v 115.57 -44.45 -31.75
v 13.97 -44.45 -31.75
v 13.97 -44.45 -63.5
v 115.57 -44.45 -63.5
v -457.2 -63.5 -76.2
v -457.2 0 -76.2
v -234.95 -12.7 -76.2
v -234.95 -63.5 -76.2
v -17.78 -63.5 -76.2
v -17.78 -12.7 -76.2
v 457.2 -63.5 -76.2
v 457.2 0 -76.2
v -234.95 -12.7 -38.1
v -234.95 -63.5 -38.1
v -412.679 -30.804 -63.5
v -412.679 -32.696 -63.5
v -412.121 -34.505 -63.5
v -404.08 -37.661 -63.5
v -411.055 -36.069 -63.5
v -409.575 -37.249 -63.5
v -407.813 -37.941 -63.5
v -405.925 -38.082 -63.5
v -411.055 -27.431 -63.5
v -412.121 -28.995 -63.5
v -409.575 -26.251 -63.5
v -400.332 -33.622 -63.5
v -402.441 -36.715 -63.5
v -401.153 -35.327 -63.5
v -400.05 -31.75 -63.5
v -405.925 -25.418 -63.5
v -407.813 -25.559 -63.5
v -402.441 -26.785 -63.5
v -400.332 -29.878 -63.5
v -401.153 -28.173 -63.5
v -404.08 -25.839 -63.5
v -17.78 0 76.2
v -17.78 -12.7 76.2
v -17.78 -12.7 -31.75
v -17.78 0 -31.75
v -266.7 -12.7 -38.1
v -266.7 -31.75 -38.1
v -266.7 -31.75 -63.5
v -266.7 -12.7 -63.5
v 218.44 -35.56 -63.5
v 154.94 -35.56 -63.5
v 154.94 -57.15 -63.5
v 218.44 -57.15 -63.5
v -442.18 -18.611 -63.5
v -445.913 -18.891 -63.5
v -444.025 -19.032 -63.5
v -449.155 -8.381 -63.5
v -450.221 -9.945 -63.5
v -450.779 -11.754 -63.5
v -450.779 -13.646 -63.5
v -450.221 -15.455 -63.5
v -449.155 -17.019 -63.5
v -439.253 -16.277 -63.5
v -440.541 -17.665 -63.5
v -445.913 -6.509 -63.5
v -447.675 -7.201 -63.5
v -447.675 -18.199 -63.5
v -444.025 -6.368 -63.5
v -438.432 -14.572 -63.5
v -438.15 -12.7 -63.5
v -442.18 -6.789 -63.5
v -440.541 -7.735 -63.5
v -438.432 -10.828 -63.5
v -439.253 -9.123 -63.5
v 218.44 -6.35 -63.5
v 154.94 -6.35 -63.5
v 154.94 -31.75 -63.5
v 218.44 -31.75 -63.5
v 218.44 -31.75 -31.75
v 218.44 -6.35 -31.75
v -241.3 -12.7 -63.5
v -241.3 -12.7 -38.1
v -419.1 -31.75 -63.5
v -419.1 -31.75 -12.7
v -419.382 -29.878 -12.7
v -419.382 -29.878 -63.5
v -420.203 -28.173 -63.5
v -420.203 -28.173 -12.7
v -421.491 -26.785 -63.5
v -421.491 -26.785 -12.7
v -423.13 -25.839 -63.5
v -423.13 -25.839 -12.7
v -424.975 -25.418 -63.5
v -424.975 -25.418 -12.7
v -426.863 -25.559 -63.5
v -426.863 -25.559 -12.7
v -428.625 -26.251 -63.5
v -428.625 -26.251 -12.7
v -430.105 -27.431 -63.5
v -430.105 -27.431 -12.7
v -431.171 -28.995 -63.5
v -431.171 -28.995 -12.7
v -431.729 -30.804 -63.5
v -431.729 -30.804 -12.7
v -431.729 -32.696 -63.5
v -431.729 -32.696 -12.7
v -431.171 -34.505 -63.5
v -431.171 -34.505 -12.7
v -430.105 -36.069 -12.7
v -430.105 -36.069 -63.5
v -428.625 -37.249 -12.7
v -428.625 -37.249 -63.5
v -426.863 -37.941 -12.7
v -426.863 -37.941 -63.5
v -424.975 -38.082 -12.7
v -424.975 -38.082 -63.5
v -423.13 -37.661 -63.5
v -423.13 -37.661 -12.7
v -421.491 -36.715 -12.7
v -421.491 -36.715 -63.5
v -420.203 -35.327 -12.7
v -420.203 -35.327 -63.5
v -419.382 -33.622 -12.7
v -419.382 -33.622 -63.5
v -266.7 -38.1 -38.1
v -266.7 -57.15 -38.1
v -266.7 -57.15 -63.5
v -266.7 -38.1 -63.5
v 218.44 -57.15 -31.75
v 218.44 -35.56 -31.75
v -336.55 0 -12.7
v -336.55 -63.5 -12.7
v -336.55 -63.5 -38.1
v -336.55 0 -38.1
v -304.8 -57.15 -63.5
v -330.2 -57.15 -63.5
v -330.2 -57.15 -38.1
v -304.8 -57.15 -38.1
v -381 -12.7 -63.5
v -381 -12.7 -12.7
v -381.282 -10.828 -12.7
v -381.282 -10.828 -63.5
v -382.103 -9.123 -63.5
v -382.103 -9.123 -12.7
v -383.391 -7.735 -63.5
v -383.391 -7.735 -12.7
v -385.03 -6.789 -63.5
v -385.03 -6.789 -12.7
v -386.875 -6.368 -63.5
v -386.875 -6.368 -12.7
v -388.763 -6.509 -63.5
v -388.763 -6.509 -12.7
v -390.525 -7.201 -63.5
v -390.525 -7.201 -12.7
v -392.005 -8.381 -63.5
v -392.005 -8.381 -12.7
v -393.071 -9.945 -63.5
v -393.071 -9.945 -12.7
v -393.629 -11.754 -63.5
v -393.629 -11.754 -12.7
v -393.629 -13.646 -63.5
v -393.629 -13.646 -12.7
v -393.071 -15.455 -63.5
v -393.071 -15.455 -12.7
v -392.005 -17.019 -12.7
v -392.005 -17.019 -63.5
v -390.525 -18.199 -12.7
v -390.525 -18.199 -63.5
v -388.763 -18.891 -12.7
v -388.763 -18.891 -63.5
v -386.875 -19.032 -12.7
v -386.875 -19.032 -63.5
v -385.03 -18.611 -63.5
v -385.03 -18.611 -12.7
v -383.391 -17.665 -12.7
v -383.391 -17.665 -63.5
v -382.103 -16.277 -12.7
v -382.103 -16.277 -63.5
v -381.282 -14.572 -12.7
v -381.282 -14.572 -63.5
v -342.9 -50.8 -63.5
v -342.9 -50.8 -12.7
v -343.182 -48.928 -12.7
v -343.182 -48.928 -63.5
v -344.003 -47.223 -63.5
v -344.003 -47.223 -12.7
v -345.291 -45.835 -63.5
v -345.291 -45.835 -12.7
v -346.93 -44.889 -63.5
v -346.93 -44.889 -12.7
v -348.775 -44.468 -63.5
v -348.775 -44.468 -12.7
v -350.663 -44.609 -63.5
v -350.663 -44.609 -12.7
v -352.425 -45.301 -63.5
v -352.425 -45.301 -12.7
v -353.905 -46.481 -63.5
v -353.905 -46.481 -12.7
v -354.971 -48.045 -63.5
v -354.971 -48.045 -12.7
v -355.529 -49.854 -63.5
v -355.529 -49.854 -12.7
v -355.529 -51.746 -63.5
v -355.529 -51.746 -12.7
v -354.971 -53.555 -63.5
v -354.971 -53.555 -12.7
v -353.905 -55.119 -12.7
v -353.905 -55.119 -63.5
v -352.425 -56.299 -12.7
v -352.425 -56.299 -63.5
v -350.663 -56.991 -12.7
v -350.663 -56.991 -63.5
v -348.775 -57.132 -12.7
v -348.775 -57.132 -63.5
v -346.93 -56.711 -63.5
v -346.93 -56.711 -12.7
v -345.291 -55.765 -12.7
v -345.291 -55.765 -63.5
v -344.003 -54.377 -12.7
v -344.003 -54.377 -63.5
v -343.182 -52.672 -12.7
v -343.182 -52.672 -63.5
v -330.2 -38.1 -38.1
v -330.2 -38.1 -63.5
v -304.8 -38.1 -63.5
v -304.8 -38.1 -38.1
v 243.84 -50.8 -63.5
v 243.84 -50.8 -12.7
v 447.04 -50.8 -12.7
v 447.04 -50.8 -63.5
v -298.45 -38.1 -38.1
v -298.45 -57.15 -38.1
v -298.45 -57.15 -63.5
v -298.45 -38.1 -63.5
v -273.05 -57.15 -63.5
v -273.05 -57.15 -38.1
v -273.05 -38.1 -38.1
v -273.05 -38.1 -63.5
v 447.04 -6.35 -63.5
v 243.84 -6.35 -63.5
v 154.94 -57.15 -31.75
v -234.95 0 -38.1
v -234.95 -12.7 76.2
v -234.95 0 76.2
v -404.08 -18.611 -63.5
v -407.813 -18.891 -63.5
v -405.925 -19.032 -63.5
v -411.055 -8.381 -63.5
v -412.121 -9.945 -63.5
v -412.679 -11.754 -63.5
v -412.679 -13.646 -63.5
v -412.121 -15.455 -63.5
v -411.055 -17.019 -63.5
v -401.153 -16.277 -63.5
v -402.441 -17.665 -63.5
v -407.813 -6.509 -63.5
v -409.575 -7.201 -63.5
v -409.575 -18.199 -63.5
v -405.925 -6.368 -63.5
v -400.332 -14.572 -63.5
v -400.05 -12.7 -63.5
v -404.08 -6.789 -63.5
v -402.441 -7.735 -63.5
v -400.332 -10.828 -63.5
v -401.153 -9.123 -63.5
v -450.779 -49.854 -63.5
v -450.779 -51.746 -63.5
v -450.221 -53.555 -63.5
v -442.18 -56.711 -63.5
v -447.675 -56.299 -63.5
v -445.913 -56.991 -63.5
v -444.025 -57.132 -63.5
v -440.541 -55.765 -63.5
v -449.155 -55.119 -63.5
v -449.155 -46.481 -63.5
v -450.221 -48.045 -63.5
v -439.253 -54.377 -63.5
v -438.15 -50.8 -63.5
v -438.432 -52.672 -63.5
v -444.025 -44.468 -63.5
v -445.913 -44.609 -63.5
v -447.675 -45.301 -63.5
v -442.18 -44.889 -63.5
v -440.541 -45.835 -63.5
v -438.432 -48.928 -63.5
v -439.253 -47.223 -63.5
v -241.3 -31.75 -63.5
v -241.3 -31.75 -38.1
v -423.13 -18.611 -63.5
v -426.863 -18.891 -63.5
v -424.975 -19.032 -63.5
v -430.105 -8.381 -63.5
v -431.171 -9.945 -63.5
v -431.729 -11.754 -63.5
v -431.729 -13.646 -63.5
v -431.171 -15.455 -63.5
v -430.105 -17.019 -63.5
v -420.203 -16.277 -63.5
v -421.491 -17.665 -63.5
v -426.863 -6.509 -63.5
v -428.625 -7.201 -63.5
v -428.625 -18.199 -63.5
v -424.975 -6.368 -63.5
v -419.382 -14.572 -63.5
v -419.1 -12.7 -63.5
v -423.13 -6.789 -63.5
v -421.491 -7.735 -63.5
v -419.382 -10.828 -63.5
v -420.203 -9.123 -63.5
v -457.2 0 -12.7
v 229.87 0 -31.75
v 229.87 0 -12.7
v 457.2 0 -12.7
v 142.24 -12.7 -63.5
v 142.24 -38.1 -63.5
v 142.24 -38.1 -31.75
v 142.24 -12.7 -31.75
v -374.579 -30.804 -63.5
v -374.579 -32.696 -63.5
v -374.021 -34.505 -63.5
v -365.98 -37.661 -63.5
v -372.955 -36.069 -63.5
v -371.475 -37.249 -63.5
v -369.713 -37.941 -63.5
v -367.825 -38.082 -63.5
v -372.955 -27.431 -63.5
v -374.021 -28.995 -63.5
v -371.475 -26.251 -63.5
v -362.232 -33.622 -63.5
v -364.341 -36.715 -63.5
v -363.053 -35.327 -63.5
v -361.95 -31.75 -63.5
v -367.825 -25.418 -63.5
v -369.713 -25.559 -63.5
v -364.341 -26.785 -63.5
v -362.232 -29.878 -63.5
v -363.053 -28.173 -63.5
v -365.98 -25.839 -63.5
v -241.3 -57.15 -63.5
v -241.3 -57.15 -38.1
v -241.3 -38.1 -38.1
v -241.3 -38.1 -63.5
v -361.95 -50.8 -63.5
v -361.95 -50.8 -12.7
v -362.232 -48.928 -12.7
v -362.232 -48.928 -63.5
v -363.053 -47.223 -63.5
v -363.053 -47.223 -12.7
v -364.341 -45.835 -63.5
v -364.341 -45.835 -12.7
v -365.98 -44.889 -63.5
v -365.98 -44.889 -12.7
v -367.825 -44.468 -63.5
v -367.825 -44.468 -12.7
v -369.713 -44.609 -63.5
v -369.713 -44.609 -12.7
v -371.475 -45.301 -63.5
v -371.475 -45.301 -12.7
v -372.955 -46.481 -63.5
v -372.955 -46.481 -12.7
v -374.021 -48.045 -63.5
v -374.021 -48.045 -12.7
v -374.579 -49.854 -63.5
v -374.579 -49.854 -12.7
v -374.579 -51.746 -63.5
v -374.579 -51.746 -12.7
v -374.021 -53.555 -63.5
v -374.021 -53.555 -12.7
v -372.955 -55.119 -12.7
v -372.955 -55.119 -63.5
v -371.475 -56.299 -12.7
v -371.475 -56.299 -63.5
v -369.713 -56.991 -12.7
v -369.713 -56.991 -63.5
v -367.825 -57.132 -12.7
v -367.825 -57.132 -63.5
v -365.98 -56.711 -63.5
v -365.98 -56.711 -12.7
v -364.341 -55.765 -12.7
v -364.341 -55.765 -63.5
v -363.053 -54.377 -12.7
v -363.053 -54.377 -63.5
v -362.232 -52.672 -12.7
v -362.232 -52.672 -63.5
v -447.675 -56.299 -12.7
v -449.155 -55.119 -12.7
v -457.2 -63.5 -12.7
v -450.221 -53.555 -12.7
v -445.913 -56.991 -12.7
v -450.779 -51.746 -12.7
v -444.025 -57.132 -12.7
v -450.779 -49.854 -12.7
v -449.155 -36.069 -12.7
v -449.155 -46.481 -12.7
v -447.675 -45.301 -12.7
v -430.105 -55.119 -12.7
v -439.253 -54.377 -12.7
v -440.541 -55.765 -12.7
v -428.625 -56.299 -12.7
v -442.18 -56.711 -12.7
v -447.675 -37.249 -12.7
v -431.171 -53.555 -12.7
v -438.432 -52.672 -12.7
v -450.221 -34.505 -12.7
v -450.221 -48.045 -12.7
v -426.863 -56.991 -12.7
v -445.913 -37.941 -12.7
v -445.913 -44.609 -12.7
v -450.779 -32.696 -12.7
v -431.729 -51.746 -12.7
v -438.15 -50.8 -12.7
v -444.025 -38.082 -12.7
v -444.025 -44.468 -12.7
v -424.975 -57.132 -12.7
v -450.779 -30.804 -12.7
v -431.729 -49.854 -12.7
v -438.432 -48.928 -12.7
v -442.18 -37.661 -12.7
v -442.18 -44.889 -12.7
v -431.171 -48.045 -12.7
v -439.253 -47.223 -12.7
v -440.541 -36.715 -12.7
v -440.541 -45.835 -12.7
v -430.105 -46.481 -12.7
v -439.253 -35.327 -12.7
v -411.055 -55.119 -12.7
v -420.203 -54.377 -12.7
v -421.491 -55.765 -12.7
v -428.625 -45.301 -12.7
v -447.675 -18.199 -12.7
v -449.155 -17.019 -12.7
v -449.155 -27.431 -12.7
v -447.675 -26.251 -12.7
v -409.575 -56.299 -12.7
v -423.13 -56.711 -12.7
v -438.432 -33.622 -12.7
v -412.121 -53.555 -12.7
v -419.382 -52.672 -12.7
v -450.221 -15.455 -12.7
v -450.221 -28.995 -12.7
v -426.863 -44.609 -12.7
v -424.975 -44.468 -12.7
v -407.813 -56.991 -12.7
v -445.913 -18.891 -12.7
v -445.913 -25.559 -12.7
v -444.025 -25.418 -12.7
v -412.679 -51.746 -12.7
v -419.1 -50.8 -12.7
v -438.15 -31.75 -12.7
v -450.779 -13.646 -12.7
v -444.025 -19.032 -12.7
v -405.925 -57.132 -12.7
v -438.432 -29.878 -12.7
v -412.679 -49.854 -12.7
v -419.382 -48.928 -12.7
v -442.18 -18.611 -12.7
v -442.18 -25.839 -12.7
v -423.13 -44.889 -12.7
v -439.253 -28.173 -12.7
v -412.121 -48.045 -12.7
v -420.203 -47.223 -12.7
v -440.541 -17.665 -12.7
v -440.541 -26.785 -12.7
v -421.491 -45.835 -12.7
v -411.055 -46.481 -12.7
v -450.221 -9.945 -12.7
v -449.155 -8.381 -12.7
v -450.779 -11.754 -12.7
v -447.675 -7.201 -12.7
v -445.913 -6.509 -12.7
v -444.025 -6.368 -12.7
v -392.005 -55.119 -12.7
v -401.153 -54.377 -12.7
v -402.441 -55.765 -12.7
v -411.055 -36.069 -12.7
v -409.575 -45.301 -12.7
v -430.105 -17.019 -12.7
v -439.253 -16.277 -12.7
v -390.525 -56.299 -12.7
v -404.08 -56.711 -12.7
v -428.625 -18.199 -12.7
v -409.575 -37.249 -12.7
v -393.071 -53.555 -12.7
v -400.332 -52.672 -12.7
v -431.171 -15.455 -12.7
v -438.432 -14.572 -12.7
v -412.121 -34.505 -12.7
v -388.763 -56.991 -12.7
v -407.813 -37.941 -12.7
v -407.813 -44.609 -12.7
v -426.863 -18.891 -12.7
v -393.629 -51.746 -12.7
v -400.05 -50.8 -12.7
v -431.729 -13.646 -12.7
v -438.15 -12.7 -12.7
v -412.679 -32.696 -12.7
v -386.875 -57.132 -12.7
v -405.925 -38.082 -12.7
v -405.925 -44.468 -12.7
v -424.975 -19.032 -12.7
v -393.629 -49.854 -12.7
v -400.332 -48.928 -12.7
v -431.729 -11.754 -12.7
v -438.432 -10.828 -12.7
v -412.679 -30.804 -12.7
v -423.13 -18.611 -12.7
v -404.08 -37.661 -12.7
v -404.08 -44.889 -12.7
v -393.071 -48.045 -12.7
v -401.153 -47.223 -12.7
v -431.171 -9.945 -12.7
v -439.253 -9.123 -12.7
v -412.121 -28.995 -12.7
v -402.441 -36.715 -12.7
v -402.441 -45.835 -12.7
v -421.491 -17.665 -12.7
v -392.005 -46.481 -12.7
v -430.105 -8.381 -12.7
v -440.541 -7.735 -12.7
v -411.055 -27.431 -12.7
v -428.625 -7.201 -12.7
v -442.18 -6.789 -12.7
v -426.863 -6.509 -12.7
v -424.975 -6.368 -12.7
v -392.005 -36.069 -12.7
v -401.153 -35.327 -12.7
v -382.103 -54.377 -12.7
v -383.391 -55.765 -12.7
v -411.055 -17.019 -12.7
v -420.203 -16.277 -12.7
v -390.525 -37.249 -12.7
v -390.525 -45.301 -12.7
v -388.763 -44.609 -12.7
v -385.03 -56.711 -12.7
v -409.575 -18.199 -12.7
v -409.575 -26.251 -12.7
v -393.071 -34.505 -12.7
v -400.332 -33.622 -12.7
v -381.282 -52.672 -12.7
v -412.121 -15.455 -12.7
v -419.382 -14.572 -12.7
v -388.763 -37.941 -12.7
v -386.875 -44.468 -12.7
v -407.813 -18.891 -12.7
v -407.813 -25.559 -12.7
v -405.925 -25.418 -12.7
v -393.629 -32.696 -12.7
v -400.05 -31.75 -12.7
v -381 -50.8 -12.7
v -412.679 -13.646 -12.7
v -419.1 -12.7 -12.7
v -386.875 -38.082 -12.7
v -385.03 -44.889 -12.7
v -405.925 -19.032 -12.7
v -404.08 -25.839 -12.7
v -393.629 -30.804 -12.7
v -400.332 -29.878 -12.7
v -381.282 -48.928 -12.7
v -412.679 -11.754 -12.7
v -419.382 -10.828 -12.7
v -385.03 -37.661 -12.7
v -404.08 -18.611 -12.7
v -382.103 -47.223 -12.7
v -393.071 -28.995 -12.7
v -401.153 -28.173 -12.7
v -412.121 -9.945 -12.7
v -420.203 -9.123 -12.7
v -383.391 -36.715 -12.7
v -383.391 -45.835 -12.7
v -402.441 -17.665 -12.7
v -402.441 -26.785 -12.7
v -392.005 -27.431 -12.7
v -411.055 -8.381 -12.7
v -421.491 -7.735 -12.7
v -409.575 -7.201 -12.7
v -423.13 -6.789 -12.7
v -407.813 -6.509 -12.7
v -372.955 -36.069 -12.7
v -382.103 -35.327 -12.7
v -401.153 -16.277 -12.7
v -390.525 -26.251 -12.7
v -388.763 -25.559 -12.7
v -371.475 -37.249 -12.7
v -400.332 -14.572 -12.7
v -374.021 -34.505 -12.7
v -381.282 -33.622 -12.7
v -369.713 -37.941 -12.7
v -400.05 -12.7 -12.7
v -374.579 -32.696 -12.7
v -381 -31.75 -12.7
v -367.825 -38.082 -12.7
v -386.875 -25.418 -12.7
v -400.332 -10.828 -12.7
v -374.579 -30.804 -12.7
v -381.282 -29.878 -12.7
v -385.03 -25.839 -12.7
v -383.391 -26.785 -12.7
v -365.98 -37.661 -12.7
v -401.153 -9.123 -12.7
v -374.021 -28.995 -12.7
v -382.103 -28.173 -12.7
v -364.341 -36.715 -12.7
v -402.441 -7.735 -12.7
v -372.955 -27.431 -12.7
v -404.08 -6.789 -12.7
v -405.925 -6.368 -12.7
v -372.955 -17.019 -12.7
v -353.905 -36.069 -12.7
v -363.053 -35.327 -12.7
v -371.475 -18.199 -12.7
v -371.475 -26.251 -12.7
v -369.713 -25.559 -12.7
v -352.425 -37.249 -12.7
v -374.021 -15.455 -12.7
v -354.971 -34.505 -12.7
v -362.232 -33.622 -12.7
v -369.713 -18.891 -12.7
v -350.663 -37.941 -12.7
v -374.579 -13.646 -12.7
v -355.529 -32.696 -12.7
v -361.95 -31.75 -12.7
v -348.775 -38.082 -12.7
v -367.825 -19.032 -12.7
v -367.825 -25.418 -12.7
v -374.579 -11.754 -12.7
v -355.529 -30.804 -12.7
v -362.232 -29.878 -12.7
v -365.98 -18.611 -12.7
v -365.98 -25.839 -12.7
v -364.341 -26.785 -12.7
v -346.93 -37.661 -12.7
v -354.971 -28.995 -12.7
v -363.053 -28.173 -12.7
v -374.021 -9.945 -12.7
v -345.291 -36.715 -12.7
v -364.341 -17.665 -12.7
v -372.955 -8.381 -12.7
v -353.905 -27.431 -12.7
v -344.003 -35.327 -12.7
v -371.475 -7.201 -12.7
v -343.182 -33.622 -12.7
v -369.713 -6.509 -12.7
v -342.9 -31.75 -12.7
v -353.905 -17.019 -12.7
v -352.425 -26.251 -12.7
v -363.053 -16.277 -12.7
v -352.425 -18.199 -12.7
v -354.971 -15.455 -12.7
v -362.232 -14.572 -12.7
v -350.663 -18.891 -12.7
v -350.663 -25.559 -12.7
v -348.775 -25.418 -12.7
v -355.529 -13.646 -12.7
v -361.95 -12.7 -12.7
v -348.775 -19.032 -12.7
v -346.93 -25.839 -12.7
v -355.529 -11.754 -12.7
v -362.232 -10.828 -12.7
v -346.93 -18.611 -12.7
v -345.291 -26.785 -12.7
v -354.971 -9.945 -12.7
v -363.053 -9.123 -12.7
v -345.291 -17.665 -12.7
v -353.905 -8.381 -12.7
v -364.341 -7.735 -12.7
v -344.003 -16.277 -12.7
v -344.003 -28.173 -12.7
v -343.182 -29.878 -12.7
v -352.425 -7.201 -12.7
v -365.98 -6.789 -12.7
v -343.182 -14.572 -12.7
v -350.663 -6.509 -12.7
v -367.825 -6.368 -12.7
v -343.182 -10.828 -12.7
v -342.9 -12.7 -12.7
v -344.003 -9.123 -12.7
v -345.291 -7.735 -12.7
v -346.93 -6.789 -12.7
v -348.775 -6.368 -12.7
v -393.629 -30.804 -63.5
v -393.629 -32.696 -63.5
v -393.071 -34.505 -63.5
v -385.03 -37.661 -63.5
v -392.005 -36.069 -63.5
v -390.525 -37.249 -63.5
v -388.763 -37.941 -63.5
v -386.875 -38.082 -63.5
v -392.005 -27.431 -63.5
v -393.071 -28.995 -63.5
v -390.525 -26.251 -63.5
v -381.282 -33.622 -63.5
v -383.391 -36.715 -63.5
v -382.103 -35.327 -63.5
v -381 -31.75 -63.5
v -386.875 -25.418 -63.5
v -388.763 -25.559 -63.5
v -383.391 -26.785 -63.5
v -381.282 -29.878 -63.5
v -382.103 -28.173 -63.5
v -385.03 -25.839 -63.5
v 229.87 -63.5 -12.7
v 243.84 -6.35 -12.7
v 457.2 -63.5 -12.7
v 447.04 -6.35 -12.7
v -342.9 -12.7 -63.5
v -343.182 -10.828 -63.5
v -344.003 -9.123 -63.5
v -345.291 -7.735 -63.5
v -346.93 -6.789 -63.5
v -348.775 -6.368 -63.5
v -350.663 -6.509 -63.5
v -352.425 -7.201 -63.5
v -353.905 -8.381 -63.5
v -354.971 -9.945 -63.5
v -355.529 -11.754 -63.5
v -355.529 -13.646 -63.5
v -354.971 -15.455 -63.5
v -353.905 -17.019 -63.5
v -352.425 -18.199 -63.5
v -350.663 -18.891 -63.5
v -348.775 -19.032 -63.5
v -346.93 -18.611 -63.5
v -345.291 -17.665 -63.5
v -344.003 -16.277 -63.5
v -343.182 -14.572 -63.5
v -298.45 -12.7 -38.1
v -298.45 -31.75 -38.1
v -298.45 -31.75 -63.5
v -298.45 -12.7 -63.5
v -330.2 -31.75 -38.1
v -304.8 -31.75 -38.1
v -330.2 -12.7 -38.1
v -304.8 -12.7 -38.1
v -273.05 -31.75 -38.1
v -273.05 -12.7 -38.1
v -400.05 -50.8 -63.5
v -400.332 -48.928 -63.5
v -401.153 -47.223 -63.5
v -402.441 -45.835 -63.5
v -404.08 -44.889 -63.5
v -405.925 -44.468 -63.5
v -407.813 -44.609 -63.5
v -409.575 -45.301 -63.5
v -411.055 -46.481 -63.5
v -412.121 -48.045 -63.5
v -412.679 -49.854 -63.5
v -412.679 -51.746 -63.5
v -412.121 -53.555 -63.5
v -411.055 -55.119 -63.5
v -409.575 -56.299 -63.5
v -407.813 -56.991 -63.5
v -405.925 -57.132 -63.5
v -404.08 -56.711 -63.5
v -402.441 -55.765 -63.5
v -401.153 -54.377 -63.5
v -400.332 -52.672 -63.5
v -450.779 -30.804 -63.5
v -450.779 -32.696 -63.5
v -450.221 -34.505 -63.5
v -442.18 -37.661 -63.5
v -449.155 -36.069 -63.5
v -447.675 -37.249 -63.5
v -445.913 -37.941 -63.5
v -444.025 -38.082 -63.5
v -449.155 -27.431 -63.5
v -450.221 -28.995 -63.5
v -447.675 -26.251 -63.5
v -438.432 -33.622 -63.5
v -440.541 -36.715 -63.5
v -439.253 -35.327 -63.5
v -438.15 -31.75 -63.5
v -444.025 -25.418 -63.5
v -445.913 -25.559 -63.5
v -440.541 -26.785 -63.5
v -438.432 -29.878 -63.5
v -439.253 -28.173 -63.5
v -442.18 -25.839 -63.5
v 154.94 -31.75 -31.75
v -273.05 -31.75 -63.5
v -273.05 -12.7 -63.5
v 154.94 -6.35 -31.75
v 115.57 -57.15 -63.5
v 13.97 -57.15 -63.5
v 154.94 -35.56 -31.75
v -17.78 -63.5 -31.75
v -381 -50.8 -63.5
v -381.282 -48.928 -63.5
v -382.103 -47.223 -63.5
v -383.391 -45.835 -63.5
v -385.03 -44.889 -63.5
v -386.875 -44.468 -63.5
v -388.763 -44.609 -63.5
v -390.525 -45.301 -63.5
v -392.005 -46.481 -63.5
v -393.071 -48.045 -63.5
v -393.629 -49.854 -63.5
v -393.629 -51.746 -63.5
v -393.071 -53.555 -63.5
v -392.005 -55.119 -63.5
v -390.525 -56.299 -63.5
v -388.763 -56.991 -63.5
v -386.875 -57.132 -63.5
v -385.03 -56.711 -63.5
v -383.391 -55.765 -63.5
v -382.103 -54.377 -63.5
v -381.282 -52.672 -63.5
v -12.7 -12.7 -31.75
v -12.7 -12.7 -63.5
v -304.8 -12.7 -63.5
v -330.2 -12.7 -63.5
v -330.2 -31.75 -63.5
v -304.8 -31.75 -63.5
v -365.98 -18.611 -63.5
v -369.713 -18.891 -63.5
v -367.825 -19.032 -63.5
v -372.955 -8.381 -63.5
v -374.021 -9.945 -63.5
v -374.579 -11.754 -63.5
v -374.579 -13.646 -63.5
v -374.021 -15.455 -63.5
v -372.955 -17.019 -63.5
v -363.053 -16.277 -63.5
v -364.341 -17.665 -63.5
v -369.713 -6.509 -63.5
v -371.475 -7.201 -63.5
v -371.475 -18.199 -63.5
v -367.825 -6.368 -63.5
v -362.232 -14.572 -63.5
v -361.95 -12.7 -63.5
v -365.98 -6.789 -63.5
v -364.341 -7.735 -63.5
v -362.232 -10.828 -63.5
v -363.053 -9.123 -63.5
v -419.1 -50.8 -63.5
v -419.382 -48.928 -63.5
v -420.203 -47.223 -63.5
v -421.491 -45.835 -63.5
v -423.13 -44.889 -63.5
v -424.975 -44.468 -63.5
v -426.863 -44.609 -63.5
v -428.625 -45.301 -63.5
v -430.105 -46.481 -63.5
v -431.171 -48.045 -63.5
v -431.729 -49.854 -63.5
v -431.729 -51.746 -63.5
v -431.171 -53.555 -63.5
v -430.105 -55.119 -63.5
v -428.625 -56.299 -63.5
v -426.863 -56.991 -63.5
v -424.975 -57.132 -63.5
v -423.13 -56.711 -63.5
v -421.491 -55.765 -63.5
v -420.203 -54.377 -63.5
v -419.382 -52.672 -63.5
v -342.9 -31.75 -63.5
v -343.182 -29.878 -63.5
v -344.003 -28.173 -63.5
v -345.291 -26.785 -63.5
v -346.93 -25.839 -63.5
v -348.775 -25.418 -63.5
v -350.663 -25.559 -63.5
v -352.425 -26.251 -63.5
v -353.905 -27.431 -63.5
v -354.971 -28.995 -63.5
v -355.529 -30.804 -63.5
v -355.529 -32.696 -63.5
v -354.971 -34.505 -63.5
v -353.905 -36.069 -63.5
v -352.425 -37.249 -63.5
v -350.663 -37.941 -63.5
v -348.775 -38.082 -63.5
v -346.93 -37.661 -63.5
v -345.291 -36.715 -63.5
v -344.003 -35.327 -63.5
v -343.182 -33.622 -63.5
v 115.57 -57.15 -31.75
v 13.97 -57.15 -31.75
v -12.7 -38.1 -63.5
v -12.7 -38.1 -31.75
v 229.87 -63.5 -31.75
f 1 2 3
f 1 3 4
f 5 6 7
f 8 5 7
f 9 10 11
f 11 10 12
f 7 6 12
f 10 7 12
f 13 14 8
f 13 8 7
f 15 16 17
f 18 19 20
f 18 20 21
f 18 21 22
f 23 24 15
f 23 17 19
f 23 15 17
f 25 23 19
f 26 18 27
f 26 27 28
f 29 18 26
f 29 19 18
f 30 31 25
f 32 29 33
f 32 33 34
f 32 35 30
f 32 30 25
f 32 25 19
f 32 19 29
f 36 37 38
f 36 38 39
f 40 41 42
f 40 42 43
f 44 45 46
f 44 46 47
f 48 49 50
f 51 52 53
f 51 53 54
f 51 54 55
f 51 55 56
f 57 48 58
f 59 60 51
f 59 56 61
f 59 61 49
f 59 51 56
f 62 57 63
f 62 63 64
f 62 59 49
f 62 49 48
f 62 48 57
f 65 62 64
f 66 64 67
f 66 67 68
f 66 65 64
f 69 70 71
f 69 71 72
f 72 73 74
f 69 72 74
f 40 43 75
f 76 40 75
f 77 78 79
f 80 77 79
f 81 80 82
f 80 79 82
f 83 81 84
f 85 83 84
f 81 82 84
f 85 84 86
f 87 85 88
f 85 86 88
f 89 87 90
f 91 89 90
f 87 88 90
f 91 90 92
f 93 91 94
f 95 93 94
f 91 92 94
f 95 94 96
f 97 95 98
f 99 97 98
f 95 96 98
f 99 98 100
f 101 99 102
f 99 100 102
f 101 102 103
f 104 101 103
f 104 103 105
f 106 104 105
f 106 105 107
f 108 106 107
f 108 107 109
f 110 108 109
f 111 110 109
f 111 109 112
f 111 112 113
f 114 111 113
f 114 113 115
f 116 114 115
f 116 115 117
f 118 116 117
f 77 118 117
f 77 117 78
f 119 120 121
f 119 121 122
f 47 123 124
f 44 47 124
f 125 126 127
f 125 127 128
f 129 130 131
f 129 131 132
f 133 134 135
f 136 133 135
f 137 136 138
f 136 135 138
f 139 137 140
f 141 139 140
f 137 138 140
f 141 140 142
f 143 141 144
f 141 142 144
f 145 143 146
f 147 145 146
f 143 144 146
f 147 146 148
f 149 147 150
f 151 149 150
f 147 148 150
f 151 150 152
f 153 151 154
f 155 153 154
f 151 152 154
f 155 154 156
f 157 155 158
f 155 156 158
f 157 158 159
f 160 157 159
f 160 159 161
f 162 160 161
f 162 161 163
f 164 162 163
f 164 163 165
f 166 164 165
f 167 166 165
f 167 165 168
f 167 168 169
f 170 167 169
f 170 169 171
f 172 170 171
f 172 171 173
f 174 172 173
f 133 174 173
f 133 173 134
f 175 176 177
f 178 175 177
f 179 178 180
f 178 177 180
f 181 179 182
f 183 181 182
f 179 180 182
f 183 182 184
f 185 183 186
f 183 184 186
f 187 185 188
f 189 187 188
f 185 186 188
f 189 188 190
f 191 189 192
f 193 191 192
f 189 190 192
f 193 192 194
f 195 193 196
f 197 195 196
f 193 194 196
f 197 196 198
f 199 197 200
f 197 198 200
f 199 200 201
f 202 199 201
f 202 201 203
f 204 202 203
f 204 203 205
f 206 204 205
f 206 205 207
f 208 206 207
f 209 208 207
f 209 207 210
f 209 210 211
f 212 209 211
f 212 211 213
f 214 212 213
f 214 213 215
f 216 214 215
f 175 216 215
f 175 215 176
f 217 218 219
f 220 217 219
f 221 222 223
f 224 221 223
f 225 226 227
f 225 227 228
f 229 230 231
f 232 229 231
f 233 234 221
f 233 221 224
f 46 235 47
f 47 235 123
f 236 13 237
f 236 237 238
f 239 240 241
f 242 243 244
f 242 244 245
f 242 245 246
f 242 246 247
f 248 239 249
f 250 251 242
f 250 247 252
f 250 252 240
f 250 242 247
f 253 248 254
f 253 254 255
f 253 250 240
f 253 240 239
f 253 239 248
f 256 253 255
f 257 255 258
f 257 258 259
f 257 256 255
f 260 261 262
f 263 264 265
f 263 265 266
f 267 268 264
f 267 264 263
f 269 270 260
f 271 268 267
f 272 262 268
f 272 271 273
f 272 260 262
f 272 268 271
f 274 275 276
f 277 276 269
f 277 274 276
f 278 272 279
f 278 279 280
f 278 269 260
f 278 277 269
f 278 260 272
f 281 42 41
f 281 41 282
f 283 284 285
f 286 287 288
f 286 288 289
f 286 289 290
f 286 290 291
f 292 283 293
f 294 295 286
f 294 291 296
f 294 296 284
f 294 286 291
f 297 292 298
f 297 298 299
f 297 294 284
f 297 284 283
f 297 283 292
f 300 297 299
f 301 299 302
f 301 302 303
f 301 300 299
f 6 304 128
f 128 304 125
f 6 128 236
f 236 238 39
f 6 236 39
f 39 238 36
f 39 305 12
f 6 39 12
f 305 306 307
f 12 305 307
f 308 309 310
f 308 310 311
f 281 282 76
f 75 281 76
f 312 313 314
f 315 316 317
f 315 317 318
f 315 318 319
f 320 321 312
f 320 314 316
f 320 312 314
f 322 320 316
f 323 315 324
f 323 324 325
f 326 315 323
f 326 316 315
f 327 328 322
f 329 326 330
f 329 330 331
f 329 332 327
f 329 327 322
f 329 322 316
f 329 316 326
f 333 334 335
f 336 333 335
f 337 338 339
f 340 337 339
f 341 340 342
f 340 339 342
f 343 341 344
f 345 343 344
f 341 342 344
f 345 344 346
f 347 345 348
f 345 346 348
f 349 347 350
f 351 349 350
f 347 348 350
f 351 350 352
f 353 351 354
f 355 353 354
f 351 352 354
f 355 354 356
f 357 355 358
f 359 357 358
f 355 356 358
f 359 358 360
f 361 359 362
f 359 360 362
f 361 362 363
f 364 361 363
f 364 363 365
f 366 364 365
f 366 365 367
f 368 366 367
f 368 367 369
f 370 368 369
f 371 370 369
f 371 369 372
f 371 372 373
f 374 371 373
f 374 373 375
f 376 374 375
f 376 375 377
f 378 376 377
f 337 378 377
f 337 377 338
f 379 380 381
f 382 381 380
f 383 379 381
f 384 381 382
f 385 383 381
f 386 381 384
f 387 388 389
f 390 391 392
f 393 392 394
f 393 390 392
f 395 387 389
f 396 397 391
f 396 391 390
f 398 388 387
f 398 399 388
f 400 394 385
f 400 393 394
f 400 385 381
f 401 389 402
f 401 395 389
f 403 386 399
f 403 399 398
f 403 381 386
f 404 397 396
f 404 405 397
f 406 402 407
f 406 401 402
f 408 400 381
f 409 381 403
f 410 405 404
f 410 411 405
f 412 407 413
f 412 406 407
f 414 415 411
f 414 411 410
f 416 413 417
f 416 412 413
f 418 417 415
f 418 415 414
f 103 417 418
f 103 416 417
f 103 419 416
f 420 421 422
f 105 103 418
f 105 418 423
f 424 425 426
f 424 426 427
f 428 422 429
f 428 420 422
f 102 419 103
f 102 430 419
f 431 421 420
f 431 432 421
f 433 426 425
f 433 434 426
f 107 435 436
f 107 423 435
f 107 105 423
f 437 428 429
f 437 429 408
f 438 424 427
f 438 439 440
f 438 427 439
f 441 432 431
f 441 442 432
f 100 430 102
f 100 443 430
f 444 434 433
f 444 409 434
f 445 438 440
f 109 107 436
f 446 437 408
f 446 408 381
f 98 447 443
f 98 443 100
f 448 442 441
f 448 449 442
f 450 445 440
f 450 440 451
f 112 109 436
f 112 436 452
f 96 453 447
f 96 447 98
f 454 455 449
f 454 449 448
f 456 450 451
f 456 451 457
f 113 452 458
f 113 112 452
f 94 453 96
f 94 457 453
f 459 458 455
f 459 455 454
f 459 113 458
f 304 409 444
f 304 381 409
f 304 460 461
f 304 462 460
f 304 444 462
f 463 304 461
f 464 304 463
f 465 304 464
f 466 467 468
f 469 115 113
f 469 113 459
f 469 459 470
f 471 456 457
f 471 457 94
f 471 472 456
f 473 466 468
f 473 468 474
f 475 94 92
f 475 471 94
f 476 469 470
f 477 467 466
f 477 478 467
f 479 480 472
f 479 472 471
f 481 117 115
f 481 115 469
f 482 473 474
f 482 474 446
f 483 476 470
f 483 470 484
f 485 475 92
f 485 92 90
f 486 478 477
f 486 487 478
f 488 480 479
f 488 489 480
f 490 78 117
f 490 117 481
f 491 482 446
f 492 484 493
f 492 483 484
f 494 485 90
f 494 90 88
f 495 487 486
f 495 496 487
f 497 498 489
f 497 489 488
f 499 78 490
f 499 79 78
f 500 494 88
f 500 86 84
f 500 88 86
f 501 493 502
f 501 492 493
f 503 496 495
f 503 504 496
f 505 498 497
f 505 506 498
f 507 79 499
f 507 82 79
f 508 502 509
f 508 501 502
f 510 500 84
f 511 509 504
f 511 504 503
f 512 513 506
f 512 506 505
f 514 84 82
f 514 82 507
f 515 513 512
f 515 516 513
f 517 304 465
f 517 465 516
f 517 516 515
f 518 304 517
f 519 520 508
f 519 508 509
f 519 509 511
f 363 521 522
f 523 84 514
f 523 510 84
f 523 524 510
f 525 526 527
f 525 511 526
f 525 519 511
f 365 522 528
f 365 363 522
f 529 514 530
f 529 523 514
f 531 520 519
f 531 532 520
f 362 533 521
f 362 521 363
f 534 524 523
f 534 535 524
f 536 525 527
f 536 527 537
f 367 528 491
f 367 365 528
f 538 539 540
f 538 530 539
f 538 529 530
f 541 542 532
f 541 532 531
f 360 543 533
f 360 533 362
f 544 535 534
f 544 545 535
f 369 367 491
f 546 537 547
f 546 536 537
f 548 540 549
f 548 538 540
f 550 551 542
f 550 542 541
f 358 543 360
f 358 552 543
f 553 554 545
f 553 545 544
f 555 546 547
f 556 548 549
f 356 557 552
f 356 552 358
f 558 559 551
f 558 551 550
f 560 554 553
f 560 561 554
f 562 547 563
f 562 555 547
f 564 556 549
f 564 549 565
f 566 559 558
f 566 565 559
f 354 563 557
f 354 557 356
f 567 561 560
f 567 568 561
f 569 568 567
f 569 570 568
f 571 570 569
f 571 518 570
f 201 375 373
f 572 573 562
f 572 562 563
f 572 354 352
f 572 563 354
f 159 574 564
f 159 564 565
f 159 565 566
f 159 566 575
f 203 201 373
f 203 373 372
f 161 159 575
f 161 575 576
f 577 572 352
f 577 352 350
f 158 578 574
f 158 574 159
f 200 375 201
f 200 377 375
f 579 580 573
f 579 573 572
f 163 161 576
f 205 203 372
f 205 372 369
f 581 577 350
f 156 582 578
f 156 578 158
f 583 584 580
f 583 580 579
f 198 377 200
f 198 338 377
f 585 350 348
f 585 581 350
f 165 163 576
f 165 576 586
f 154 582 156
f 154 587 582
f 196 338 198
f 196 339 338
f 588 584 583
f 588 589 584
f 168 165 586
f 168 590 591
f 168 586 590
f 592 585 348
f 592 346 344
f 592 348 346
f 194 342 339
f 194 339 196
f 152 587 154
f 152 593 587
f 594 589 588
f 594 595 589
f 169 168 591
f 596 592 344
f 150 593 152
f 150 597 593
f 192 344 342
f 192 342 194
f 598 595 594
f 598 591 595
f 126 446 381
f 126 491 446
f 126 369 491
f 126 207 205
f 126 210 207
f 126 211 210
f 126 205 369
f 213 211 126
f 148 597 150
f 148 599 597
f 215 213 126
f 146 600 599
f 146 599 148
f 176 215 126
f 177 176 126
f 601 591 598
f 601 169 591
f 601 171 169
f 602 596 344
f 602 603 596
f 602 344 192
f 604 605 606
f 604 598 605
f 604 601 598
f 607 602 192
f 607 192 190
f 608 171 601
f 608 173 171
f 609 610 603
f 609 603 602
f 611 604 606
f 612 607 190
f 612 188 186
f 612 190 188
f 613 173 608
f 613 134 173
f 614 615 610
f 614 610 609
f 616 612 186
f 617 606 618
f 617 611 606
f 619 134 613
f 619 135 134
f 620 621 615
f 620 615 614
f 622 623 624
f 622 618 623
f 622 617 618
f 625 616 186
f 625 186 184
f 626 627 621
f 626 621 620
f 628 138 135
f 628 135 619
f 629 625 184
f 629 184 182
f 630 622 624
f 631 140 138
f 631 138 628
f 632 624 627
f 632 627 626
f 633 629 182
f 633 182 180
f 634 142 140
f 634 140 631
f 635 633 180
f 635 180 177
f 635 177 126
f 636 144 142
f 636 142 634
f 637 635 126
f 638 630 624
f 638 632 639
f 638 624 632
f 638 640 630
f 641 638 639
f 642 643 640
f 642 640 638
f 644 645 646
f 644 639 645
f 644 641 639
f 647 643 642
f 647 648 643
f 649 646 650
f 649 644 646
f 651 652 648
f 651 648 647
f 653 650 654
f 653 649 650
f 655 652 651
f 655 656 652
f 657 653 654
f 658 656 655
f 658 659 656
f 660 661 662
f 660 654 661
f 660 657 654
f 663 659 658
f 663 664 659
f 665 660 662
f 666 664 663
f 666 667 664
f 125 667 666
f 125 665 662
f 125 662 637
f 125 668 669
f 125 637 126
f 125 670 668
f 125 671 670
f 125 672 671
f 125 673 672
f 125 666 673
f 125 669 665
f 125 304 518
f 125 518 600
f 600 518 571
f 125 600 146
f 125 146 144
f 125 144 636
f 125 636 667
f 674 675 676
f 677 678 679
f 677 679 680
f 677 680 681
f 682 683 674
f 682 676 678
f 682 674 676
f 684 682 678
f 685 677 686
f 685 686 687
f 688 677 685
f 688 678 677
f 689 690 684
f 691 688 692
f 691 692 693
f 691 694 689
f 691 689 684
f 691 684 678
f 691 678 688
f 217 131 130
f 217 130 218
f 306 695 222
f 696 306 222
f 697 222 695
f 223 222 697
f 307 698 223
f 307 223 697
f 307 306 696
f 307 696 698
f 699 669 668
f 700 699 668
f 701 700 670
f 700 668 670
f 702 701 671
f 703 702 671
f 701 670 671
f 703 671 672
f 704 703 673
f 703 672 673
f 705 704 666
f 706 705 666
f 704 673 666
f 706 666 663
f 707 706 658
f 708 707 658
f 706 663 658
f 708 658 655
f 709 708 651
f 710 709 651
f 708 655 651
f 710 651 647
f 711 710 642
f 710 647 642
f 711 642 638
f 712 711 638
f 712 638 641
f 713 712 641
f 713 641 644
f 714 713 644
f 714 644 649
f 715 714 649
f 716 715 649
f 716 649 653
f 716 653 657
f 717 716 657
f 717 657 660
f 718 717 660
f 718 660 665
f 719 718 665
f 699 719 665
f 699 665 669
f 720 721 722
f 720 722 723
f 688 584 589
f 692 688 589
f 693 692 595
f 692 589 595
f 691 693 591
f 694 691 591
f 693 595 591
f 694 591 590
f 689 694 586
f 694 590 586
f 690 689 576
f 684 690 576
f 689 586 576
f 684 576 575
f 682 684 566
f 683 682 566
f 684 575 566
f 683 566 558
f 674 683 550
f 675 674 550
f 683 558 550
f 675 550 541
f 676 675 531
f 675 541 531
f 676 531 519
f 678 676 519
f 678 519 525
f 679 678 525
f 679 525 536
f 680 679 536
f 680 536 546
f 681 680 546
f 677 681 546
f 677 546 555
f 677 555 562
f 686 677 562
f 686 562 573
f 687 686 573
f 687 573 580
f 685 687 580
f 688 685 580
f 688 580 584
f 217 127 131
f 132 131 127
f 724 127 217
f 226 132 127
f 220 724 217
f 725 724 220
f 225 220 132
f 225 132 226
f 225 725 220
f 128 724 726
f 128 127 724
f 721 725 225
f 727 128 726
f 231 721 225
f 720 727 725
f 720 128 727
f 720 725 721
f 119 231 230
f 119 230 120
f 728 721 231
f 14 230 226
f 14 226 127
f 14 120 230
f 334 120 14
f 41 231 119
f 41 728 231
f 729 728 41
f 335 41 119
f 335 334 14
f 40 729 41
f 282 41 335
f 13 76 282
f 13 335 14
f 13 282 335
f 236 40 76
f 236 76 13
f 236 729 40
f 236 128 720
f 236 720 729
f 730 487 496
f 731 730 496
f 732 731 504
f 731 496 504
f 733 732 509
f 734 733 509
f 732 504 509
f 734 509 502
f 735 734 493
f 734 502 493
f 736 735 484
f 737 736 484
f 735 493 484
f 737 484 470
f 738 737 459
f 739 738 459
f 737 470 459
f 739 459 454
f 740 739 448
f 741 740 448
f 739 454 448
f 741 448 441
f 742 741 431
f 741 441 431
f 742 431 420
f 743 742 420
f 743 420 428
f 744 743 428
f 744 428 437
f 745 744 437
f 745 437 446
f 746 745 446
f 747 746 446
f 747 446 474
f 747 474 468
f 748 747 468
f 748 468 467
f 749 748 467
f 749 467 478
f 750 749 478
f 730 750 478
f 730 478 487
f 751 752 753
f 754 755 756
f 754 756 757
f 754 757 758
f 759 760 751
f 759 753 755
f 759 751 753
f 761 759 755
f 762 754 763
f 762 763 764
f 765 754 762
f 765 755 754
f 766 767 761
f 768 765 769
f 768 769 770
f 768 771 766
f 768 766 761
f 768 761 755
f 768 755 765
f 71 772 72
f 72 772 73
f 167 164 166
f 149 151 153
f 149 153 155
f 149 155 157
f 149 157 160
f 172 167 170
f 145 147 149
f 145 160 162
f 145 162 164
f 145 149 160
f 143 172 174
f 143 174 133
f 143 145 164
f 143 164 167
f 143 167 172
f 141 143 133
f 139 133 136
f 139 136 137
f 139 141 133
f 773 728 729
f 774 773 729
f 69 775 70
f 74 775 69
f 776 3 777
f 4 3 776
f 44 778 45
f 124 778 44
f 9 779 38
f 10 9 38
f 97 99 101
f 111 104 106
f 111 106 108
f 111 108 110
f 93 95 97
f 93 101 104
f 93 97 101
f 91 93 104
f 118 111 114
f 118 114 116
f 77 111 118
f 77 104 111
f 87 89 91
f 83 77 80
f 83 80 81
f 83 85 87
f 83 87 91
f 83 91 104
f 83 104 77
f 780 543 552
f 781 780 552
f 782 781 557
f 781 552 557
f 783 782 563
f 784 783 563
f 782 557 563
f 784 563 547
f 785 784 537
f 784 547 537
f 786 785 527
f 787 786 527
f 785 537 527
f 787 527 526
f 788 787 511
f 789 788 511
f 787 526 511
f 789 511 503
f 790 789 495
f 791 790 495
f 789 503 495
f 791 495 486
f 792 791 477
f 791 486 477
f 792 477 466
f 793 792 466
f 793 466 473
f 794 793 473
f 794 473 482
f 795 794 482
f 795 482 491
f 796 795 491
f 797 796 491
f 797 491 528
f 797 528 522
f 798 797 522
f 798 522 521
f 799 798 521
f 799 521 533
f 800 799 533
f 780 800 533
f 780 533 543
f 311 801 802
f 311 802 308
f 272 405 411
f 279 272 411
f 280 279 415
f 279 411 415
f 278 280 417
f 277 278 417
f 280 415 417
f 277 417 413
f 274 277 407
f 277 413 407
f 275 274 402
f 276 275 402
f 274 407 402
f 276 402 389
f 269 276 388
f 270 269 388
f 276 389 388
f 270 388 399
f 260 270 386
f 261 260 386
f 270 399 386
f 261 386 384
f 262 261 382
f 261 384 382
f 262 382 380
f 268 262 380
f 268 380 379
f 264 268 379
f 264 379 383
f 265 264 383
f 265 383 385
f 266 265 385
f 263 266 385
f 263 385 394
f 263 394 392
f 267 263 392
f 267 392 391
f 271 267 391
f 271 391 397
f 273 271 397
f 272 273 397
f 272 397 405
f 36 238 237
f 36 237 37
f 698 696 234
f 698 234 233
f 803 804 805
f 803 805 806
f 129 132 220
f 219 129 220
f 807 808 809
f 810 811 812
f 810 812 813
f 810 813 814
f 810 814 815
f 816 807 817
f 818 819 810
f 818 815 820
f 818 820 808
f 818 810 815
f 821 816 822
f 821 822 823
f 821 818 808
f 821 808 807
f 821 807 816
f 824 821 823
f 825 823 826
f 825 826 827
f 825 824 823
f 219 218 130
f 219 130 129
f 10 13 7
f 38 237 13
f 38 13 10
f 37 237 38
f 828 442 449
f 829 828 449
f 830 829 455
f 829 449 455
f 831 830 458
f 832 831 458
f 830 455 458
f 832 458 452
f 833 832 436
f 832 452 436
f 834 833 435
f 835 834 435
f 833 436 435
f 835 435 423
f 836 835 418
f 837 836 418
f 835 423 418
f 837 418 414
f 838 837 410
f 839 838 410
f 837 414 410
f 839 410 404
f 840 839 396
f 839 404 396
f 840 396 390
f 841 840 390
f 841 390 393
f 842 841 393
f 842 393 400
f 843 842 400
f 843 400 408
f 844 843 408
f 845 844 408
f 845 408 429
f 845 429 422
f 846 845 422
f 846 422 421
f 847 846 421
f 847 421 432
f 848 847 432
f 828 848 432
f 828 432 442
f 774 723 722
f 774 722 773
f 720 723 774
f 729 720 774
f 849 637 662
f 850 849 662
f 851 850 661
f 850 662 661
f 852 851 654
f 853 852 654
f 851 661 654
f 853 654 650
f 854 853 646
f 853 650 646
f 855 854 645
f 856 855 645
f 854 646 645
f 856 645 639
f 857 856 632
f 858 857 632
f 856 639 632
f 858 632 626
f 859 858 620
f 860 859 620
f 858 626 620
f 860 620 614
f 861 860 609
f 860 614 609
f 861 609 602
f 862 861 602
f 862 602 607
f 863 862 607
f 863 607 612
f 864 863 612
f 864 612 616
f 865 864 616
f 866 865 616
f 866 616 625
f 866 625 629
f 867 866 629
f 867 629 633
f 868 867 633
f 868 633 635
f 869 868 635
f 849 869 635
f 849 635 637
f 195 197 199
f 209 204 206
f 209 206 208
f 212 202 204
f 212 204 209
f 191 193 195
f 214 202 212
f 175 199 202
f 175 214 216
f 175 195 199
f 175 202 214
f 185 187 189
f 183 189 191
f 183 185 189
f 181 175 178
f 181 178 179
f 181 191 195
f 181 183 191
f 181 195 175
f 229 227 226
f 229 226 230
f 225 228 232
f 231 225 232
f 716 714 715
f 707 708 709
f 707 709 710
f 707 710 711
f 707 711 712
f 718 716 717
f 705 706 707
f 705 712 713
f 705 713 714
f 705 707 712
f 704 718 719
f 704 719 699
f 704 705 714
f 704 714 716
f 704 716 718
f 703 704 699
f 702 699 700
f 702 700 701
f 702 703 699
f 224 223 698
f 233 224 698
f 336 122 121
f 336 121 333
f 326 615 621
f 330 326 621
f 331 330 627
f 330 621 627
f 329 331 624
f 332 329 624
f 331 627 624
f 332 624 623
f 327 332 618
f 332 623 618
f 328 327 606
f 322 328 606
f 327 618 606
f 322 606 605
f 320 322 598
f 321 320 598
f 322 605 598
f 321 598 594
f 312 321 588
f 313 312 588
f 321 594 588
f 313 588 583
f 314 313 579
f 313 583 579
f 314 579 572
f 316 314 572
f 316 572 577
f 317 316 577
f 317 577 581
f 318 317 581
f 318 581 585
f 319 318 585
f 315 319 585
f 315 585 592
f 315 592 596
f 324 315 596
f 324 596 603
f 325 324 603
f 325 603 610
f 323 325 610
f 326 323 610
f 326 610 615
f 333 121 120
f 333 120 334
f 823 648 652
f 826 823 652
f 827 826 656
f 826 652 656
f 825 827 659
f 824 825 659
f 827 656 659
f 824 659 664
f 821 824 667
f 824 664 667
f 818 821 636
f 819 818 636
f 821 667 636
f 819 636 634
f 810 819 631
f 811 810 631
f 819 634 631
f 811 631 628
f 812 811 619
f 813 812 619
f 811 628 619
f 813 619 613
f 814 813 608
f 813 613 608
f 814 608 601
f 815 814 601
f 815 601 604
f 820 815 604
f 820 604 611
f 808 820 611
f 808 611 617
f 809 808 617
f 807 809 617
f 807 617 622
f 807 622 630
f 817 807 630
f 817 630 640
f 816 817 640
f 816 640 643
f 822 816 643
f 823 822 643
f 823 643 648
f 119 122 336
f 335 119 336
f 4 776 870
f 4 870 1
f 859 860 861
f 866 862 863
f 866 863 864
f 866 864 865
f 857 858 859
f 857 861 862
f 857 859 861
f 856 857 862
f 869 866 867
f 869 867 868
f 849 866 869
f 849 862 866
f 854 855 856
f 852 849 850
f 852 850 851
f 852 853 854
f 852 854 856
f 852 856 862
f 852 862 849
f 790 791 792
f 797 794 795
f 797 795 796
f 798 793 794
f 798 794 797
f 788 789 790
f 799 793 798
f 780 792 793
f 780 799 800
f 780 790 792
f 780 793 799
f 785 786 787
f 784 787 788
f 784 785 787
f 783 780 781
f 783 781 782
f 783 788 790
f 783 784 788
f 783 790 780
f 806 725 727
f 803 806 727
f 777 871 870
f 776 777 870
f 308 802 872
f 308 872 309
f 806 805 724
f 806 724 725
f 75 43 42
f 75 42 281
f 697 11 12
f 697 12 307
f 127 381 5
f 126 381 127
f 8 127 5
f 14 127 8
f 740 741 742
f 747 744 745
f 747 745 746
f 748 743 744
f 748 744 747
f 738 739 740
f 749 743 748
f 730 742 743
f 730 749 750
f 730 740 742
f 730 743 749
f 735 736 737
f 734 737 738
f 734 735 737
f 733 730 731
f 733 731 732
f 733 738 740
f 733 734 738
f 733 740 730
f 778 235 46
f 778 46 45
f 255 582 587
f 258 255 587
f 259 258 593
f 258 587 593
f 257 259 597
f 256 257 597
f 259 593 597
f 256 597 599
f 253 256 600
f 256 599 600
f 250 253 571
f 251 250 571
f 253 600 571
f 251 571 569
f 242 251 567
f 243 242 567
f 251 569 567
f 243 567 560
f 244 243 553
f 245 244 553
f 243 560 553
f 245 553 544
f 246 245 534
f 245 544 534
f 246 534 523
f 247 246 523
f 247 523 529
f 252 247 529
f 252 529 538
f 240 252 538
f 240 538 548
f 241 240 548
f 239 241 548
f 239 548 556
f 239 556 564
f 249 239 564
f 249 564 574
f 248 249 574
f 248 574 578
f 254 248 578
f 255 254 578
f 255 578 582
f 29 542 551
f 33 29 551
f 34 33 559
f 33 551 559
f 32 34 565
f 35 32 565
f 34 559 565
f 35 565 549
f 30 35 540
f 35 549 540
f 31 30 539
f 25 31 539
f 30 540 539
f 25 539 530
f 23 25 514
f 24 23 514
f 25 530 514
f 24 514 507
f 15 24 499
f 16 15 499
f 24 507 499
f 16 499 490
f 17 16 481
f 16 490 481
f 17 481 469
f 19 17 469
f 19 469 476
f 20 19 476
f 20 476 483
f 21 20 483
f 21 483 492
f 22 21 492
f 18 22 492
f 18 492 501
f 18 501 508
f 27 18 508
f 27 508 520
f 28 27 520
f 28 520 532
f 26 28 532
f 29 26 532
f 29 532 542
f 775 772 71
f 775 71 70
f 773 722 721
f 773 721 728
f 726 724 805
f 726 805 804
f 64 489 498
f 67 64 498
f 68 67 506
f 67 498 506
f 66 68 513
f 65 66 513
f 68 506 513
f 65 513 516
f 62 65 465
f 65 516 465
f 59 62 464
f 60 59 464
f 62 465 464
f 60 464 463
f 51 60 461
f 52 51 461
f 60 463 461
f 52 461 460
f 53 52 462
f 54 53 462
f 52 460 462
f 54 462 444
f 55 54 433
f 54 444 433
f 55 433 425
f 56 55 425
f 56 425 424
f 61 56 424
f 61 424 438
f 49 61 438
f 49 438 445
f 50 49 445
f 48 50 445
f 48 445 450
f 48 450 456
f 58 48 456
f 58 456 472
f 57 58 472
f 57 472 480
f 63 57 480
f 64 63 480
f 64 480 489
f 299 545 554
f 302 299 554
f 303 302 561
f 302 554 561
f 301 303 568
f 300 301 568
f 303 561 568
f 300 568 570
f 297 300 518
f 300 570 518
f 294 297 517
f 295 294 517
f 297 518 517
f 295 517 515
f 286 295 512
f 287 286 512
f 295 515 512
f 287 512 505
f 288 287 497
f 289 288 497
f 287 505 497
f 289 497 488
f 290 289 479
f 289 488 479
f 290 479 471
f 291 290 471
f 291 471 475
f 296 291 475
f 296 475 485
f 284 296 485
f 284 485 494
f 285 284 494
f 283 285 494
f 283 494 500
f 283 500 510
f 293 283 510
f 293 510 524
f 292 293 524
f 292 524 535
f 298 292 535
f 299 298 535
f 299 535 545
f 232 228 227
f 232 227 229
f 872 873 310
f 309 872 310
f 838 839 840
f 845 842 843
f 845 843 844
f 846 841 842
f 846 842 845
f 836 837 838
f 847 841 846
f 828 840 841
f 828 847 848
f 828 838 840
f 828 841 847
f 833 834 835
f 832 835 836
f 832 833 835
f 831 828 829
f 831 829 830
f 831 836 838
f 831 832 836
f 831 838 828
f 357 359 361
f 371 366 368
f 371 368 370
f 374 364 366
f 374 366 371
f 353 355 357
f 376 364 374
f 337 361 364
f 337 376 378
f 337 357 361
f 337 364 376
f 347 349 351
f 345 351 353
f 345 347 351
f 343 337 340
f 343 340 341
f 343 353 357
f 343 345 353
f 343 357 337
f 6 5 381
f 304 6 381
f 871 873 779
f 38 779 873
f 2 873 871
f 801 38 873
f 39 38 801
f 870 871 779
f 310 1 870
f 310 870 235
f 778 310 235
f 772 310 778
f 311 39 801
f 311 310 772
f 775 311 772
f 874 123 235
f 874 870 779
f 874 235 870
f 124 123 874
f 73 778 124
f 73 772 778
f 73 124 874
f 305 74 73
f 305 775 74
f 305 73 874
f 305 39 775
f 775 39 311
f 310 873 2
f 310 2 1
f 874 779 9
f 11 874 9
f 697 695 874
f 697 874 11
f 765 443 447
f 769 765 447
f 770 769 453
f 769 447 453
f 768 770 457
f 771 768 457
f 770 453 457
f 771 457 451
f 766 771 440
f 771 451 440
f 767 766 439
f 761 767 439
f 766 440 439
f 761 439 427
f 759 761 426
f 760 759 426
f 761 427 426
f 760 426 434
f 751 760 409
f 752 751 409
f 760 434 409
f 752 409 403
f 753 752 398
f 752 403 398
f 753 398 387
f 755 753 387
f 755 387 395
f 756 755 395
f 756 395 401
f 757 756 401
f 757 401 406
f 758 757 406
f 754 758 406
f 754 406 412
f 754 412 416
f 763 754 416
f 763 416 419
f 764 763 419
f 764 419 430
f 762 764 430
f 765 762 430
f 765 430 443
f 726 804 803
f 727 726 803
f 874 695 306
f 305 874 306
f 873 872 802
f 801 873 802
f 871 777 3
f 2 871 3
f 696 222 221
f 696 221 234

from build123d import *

# Parameters (mm, degrees)
F0_W      = 914.4
F0_H      = 152.4
F1_DEPTH  = 63.5
F2_R      = 6.35
F2_W      = 25.4
F2_H      = 19.05
F2_W_2    = 154.94
F2_H_2    = 25.4
F2_W_3    = 101.6
F2_H_3    = 12.7
F2_W_4    = 63.5
F2_W_5    = 203.2
F2_H_4    = 44.45
F2_H_5    = 21.59
F3_DEPTH  = 139.7
F4_W      = 120.65
F4_H      = 63.5
F5_DEPTH  = 88.9
F6_W      = 101.6
F6_H      = 63.5
F7_DEPTH  = 114.3
F8_W      = 247.65
F8_H      = 63.5
F9_DEPTH  = 107.95
F10_W     = 227.33
F10_H     = 63.5
F11_DEPTH = 88.9
F12_W     = 217.17
F12_H     = 50.8
F13_DEPTH = 152.4


with BuildPart() as f1:
    # F0 (on Front) → F1 (new body)
    with BuildSketch(Plane.XZ):
        Rectangle(F0_W, F0_H)
    extrude(amount=F1_DEPTH)

    # F2 (on face) → F3 (cut)
    with BuildSketch(Plane.XY.offset(76.2)):
        with Locations((-444.5, -12.7)):
            Circle(F2_R)
        with Locations((-425.45, -12.7)):
            Circle(F2_R)
        with Locations((-406.4, -12.7)):
            Circle(F2_R)
        with Locations((-387.35, -12.7)):
            Circle(F2_R)
        with Locations((-368.3, -12.7)):
            Circle(F2_R)
        with Locations((-349.25, -12.7)):
            Circle(F2_R)
        with Locations((-444.5, -31.75)):
            Circle(F2_R)
        with Locations((-425.45, -31.75)):
            Circle(F2_R)
        with Locations((-406.4, -31.75)):
            Circle(F2_R)
        with Locations((-387.35, -31.75)):
            Circle(F2_R)
        with Locations((-368.3, -31.75)):
            Circle(F2_R)
        with Locations((-349.25, -31.75)):
            Circle(F2_R)
        with Locations((-444.5, -50.8)):
            Circle(F2_R)
        with Locations((-425.45, -50.8)):
            Circle(F2_R)
        with Locations((-406.4, -50.8)):
            Circle(F2_R)
        with Locations((-387.35, -50.8)):
            Circle(F2_R)
        with Locations((-368.3, -50.8)):
            Circle(F2_R)
        with Locations((-349.25, -50.8)):
            Circle(F2_R)
        with Locations((-317.5, -47.625)):
            Rectangle(F2_W, F2_H)
        with Locations((-317.5, -22.225)):
            Rectangle(F2_W, F2_H)
        with Locations((-285.75, -22.225)):
            Rectangle(F2_W, F2_H)
        with Locations((-285.75, -47.625)):
            Rectangle(F2_W, F2_H)
        with Locations((-254, -22.225)):
            Rectangle(F2_W, F2_H)
        with Locations((-254, -47.625)):
            Rectangle(F2_W, F2_H)
        with Locations((64.77, -25.4)):
            Rectangle(F2_W_2, F2_H_2)
        with Locations((64.77, -50.8)):
            Rectangle(F2_W_3, F2_H_3)
        with Locations((186.69, -19.05)):
            Rectangle(F2_W_4, F2_H_2)
        with Locations((345.44, -28.575)):
            Rectangle(F2_W_5, F2_H_4)
        with Locations((186.69, -46.355)):
            Rectangle(F2_W_4, F2_H_5)
    extrude(amount=-F3_DEPTH, mode=Mode.SUBTRACT)

    # F4 (on face) → F5 (cut)
    with BuildSketch(Plane.XY.offset(76.2)):
        with Locations((-396.875, -31.75)):
            Rectangle(F4_W, F4_H)
    extrude(amount=-F5_DEPTH, mode=Mode.SUBTRACT)

    # F6 (on face) → F7 (cut)
    with BuildSketch(Plane.XY.offset(76.2)):
        with Locations((-285.75, -31.75)):
            Rectangle(F6_W, F6_H)
    extrude(amount=-F7_DEPTH, mode=Mode.SUBTRACT)

    # F8 (on face) → F9 (cut)
    with BuildSketch(Plane.XY.offset(76.2)):
        with Locations((106.045, -31.75)):
            Rectangle(F8_W, F8_H)
    extrude(amount=-F9_DEPTH, mode=Mode.SUBTRACT)

    # F10 (on face) → F11 (cut)
    with BuildSketch(Plane.XY.offset(76.2)):
        with Locations((343.535, -31.75)):
            Rectangle(F10_W, F10_H)
    extrude(amount=-F11_DEPTH, mode=Mode.SUBTRACT)

    # F12 (on face) → F13 (cut)
    with BuildSketch(Plane.XY.offset(76.2)):
        with Locations((-126.365, -38.1)):
            Rectangle(F12_W, F12_H)
    extrude(amount=-F13_DEPTH, mode=Mode.SUBTRACT)


solid = f1.part
